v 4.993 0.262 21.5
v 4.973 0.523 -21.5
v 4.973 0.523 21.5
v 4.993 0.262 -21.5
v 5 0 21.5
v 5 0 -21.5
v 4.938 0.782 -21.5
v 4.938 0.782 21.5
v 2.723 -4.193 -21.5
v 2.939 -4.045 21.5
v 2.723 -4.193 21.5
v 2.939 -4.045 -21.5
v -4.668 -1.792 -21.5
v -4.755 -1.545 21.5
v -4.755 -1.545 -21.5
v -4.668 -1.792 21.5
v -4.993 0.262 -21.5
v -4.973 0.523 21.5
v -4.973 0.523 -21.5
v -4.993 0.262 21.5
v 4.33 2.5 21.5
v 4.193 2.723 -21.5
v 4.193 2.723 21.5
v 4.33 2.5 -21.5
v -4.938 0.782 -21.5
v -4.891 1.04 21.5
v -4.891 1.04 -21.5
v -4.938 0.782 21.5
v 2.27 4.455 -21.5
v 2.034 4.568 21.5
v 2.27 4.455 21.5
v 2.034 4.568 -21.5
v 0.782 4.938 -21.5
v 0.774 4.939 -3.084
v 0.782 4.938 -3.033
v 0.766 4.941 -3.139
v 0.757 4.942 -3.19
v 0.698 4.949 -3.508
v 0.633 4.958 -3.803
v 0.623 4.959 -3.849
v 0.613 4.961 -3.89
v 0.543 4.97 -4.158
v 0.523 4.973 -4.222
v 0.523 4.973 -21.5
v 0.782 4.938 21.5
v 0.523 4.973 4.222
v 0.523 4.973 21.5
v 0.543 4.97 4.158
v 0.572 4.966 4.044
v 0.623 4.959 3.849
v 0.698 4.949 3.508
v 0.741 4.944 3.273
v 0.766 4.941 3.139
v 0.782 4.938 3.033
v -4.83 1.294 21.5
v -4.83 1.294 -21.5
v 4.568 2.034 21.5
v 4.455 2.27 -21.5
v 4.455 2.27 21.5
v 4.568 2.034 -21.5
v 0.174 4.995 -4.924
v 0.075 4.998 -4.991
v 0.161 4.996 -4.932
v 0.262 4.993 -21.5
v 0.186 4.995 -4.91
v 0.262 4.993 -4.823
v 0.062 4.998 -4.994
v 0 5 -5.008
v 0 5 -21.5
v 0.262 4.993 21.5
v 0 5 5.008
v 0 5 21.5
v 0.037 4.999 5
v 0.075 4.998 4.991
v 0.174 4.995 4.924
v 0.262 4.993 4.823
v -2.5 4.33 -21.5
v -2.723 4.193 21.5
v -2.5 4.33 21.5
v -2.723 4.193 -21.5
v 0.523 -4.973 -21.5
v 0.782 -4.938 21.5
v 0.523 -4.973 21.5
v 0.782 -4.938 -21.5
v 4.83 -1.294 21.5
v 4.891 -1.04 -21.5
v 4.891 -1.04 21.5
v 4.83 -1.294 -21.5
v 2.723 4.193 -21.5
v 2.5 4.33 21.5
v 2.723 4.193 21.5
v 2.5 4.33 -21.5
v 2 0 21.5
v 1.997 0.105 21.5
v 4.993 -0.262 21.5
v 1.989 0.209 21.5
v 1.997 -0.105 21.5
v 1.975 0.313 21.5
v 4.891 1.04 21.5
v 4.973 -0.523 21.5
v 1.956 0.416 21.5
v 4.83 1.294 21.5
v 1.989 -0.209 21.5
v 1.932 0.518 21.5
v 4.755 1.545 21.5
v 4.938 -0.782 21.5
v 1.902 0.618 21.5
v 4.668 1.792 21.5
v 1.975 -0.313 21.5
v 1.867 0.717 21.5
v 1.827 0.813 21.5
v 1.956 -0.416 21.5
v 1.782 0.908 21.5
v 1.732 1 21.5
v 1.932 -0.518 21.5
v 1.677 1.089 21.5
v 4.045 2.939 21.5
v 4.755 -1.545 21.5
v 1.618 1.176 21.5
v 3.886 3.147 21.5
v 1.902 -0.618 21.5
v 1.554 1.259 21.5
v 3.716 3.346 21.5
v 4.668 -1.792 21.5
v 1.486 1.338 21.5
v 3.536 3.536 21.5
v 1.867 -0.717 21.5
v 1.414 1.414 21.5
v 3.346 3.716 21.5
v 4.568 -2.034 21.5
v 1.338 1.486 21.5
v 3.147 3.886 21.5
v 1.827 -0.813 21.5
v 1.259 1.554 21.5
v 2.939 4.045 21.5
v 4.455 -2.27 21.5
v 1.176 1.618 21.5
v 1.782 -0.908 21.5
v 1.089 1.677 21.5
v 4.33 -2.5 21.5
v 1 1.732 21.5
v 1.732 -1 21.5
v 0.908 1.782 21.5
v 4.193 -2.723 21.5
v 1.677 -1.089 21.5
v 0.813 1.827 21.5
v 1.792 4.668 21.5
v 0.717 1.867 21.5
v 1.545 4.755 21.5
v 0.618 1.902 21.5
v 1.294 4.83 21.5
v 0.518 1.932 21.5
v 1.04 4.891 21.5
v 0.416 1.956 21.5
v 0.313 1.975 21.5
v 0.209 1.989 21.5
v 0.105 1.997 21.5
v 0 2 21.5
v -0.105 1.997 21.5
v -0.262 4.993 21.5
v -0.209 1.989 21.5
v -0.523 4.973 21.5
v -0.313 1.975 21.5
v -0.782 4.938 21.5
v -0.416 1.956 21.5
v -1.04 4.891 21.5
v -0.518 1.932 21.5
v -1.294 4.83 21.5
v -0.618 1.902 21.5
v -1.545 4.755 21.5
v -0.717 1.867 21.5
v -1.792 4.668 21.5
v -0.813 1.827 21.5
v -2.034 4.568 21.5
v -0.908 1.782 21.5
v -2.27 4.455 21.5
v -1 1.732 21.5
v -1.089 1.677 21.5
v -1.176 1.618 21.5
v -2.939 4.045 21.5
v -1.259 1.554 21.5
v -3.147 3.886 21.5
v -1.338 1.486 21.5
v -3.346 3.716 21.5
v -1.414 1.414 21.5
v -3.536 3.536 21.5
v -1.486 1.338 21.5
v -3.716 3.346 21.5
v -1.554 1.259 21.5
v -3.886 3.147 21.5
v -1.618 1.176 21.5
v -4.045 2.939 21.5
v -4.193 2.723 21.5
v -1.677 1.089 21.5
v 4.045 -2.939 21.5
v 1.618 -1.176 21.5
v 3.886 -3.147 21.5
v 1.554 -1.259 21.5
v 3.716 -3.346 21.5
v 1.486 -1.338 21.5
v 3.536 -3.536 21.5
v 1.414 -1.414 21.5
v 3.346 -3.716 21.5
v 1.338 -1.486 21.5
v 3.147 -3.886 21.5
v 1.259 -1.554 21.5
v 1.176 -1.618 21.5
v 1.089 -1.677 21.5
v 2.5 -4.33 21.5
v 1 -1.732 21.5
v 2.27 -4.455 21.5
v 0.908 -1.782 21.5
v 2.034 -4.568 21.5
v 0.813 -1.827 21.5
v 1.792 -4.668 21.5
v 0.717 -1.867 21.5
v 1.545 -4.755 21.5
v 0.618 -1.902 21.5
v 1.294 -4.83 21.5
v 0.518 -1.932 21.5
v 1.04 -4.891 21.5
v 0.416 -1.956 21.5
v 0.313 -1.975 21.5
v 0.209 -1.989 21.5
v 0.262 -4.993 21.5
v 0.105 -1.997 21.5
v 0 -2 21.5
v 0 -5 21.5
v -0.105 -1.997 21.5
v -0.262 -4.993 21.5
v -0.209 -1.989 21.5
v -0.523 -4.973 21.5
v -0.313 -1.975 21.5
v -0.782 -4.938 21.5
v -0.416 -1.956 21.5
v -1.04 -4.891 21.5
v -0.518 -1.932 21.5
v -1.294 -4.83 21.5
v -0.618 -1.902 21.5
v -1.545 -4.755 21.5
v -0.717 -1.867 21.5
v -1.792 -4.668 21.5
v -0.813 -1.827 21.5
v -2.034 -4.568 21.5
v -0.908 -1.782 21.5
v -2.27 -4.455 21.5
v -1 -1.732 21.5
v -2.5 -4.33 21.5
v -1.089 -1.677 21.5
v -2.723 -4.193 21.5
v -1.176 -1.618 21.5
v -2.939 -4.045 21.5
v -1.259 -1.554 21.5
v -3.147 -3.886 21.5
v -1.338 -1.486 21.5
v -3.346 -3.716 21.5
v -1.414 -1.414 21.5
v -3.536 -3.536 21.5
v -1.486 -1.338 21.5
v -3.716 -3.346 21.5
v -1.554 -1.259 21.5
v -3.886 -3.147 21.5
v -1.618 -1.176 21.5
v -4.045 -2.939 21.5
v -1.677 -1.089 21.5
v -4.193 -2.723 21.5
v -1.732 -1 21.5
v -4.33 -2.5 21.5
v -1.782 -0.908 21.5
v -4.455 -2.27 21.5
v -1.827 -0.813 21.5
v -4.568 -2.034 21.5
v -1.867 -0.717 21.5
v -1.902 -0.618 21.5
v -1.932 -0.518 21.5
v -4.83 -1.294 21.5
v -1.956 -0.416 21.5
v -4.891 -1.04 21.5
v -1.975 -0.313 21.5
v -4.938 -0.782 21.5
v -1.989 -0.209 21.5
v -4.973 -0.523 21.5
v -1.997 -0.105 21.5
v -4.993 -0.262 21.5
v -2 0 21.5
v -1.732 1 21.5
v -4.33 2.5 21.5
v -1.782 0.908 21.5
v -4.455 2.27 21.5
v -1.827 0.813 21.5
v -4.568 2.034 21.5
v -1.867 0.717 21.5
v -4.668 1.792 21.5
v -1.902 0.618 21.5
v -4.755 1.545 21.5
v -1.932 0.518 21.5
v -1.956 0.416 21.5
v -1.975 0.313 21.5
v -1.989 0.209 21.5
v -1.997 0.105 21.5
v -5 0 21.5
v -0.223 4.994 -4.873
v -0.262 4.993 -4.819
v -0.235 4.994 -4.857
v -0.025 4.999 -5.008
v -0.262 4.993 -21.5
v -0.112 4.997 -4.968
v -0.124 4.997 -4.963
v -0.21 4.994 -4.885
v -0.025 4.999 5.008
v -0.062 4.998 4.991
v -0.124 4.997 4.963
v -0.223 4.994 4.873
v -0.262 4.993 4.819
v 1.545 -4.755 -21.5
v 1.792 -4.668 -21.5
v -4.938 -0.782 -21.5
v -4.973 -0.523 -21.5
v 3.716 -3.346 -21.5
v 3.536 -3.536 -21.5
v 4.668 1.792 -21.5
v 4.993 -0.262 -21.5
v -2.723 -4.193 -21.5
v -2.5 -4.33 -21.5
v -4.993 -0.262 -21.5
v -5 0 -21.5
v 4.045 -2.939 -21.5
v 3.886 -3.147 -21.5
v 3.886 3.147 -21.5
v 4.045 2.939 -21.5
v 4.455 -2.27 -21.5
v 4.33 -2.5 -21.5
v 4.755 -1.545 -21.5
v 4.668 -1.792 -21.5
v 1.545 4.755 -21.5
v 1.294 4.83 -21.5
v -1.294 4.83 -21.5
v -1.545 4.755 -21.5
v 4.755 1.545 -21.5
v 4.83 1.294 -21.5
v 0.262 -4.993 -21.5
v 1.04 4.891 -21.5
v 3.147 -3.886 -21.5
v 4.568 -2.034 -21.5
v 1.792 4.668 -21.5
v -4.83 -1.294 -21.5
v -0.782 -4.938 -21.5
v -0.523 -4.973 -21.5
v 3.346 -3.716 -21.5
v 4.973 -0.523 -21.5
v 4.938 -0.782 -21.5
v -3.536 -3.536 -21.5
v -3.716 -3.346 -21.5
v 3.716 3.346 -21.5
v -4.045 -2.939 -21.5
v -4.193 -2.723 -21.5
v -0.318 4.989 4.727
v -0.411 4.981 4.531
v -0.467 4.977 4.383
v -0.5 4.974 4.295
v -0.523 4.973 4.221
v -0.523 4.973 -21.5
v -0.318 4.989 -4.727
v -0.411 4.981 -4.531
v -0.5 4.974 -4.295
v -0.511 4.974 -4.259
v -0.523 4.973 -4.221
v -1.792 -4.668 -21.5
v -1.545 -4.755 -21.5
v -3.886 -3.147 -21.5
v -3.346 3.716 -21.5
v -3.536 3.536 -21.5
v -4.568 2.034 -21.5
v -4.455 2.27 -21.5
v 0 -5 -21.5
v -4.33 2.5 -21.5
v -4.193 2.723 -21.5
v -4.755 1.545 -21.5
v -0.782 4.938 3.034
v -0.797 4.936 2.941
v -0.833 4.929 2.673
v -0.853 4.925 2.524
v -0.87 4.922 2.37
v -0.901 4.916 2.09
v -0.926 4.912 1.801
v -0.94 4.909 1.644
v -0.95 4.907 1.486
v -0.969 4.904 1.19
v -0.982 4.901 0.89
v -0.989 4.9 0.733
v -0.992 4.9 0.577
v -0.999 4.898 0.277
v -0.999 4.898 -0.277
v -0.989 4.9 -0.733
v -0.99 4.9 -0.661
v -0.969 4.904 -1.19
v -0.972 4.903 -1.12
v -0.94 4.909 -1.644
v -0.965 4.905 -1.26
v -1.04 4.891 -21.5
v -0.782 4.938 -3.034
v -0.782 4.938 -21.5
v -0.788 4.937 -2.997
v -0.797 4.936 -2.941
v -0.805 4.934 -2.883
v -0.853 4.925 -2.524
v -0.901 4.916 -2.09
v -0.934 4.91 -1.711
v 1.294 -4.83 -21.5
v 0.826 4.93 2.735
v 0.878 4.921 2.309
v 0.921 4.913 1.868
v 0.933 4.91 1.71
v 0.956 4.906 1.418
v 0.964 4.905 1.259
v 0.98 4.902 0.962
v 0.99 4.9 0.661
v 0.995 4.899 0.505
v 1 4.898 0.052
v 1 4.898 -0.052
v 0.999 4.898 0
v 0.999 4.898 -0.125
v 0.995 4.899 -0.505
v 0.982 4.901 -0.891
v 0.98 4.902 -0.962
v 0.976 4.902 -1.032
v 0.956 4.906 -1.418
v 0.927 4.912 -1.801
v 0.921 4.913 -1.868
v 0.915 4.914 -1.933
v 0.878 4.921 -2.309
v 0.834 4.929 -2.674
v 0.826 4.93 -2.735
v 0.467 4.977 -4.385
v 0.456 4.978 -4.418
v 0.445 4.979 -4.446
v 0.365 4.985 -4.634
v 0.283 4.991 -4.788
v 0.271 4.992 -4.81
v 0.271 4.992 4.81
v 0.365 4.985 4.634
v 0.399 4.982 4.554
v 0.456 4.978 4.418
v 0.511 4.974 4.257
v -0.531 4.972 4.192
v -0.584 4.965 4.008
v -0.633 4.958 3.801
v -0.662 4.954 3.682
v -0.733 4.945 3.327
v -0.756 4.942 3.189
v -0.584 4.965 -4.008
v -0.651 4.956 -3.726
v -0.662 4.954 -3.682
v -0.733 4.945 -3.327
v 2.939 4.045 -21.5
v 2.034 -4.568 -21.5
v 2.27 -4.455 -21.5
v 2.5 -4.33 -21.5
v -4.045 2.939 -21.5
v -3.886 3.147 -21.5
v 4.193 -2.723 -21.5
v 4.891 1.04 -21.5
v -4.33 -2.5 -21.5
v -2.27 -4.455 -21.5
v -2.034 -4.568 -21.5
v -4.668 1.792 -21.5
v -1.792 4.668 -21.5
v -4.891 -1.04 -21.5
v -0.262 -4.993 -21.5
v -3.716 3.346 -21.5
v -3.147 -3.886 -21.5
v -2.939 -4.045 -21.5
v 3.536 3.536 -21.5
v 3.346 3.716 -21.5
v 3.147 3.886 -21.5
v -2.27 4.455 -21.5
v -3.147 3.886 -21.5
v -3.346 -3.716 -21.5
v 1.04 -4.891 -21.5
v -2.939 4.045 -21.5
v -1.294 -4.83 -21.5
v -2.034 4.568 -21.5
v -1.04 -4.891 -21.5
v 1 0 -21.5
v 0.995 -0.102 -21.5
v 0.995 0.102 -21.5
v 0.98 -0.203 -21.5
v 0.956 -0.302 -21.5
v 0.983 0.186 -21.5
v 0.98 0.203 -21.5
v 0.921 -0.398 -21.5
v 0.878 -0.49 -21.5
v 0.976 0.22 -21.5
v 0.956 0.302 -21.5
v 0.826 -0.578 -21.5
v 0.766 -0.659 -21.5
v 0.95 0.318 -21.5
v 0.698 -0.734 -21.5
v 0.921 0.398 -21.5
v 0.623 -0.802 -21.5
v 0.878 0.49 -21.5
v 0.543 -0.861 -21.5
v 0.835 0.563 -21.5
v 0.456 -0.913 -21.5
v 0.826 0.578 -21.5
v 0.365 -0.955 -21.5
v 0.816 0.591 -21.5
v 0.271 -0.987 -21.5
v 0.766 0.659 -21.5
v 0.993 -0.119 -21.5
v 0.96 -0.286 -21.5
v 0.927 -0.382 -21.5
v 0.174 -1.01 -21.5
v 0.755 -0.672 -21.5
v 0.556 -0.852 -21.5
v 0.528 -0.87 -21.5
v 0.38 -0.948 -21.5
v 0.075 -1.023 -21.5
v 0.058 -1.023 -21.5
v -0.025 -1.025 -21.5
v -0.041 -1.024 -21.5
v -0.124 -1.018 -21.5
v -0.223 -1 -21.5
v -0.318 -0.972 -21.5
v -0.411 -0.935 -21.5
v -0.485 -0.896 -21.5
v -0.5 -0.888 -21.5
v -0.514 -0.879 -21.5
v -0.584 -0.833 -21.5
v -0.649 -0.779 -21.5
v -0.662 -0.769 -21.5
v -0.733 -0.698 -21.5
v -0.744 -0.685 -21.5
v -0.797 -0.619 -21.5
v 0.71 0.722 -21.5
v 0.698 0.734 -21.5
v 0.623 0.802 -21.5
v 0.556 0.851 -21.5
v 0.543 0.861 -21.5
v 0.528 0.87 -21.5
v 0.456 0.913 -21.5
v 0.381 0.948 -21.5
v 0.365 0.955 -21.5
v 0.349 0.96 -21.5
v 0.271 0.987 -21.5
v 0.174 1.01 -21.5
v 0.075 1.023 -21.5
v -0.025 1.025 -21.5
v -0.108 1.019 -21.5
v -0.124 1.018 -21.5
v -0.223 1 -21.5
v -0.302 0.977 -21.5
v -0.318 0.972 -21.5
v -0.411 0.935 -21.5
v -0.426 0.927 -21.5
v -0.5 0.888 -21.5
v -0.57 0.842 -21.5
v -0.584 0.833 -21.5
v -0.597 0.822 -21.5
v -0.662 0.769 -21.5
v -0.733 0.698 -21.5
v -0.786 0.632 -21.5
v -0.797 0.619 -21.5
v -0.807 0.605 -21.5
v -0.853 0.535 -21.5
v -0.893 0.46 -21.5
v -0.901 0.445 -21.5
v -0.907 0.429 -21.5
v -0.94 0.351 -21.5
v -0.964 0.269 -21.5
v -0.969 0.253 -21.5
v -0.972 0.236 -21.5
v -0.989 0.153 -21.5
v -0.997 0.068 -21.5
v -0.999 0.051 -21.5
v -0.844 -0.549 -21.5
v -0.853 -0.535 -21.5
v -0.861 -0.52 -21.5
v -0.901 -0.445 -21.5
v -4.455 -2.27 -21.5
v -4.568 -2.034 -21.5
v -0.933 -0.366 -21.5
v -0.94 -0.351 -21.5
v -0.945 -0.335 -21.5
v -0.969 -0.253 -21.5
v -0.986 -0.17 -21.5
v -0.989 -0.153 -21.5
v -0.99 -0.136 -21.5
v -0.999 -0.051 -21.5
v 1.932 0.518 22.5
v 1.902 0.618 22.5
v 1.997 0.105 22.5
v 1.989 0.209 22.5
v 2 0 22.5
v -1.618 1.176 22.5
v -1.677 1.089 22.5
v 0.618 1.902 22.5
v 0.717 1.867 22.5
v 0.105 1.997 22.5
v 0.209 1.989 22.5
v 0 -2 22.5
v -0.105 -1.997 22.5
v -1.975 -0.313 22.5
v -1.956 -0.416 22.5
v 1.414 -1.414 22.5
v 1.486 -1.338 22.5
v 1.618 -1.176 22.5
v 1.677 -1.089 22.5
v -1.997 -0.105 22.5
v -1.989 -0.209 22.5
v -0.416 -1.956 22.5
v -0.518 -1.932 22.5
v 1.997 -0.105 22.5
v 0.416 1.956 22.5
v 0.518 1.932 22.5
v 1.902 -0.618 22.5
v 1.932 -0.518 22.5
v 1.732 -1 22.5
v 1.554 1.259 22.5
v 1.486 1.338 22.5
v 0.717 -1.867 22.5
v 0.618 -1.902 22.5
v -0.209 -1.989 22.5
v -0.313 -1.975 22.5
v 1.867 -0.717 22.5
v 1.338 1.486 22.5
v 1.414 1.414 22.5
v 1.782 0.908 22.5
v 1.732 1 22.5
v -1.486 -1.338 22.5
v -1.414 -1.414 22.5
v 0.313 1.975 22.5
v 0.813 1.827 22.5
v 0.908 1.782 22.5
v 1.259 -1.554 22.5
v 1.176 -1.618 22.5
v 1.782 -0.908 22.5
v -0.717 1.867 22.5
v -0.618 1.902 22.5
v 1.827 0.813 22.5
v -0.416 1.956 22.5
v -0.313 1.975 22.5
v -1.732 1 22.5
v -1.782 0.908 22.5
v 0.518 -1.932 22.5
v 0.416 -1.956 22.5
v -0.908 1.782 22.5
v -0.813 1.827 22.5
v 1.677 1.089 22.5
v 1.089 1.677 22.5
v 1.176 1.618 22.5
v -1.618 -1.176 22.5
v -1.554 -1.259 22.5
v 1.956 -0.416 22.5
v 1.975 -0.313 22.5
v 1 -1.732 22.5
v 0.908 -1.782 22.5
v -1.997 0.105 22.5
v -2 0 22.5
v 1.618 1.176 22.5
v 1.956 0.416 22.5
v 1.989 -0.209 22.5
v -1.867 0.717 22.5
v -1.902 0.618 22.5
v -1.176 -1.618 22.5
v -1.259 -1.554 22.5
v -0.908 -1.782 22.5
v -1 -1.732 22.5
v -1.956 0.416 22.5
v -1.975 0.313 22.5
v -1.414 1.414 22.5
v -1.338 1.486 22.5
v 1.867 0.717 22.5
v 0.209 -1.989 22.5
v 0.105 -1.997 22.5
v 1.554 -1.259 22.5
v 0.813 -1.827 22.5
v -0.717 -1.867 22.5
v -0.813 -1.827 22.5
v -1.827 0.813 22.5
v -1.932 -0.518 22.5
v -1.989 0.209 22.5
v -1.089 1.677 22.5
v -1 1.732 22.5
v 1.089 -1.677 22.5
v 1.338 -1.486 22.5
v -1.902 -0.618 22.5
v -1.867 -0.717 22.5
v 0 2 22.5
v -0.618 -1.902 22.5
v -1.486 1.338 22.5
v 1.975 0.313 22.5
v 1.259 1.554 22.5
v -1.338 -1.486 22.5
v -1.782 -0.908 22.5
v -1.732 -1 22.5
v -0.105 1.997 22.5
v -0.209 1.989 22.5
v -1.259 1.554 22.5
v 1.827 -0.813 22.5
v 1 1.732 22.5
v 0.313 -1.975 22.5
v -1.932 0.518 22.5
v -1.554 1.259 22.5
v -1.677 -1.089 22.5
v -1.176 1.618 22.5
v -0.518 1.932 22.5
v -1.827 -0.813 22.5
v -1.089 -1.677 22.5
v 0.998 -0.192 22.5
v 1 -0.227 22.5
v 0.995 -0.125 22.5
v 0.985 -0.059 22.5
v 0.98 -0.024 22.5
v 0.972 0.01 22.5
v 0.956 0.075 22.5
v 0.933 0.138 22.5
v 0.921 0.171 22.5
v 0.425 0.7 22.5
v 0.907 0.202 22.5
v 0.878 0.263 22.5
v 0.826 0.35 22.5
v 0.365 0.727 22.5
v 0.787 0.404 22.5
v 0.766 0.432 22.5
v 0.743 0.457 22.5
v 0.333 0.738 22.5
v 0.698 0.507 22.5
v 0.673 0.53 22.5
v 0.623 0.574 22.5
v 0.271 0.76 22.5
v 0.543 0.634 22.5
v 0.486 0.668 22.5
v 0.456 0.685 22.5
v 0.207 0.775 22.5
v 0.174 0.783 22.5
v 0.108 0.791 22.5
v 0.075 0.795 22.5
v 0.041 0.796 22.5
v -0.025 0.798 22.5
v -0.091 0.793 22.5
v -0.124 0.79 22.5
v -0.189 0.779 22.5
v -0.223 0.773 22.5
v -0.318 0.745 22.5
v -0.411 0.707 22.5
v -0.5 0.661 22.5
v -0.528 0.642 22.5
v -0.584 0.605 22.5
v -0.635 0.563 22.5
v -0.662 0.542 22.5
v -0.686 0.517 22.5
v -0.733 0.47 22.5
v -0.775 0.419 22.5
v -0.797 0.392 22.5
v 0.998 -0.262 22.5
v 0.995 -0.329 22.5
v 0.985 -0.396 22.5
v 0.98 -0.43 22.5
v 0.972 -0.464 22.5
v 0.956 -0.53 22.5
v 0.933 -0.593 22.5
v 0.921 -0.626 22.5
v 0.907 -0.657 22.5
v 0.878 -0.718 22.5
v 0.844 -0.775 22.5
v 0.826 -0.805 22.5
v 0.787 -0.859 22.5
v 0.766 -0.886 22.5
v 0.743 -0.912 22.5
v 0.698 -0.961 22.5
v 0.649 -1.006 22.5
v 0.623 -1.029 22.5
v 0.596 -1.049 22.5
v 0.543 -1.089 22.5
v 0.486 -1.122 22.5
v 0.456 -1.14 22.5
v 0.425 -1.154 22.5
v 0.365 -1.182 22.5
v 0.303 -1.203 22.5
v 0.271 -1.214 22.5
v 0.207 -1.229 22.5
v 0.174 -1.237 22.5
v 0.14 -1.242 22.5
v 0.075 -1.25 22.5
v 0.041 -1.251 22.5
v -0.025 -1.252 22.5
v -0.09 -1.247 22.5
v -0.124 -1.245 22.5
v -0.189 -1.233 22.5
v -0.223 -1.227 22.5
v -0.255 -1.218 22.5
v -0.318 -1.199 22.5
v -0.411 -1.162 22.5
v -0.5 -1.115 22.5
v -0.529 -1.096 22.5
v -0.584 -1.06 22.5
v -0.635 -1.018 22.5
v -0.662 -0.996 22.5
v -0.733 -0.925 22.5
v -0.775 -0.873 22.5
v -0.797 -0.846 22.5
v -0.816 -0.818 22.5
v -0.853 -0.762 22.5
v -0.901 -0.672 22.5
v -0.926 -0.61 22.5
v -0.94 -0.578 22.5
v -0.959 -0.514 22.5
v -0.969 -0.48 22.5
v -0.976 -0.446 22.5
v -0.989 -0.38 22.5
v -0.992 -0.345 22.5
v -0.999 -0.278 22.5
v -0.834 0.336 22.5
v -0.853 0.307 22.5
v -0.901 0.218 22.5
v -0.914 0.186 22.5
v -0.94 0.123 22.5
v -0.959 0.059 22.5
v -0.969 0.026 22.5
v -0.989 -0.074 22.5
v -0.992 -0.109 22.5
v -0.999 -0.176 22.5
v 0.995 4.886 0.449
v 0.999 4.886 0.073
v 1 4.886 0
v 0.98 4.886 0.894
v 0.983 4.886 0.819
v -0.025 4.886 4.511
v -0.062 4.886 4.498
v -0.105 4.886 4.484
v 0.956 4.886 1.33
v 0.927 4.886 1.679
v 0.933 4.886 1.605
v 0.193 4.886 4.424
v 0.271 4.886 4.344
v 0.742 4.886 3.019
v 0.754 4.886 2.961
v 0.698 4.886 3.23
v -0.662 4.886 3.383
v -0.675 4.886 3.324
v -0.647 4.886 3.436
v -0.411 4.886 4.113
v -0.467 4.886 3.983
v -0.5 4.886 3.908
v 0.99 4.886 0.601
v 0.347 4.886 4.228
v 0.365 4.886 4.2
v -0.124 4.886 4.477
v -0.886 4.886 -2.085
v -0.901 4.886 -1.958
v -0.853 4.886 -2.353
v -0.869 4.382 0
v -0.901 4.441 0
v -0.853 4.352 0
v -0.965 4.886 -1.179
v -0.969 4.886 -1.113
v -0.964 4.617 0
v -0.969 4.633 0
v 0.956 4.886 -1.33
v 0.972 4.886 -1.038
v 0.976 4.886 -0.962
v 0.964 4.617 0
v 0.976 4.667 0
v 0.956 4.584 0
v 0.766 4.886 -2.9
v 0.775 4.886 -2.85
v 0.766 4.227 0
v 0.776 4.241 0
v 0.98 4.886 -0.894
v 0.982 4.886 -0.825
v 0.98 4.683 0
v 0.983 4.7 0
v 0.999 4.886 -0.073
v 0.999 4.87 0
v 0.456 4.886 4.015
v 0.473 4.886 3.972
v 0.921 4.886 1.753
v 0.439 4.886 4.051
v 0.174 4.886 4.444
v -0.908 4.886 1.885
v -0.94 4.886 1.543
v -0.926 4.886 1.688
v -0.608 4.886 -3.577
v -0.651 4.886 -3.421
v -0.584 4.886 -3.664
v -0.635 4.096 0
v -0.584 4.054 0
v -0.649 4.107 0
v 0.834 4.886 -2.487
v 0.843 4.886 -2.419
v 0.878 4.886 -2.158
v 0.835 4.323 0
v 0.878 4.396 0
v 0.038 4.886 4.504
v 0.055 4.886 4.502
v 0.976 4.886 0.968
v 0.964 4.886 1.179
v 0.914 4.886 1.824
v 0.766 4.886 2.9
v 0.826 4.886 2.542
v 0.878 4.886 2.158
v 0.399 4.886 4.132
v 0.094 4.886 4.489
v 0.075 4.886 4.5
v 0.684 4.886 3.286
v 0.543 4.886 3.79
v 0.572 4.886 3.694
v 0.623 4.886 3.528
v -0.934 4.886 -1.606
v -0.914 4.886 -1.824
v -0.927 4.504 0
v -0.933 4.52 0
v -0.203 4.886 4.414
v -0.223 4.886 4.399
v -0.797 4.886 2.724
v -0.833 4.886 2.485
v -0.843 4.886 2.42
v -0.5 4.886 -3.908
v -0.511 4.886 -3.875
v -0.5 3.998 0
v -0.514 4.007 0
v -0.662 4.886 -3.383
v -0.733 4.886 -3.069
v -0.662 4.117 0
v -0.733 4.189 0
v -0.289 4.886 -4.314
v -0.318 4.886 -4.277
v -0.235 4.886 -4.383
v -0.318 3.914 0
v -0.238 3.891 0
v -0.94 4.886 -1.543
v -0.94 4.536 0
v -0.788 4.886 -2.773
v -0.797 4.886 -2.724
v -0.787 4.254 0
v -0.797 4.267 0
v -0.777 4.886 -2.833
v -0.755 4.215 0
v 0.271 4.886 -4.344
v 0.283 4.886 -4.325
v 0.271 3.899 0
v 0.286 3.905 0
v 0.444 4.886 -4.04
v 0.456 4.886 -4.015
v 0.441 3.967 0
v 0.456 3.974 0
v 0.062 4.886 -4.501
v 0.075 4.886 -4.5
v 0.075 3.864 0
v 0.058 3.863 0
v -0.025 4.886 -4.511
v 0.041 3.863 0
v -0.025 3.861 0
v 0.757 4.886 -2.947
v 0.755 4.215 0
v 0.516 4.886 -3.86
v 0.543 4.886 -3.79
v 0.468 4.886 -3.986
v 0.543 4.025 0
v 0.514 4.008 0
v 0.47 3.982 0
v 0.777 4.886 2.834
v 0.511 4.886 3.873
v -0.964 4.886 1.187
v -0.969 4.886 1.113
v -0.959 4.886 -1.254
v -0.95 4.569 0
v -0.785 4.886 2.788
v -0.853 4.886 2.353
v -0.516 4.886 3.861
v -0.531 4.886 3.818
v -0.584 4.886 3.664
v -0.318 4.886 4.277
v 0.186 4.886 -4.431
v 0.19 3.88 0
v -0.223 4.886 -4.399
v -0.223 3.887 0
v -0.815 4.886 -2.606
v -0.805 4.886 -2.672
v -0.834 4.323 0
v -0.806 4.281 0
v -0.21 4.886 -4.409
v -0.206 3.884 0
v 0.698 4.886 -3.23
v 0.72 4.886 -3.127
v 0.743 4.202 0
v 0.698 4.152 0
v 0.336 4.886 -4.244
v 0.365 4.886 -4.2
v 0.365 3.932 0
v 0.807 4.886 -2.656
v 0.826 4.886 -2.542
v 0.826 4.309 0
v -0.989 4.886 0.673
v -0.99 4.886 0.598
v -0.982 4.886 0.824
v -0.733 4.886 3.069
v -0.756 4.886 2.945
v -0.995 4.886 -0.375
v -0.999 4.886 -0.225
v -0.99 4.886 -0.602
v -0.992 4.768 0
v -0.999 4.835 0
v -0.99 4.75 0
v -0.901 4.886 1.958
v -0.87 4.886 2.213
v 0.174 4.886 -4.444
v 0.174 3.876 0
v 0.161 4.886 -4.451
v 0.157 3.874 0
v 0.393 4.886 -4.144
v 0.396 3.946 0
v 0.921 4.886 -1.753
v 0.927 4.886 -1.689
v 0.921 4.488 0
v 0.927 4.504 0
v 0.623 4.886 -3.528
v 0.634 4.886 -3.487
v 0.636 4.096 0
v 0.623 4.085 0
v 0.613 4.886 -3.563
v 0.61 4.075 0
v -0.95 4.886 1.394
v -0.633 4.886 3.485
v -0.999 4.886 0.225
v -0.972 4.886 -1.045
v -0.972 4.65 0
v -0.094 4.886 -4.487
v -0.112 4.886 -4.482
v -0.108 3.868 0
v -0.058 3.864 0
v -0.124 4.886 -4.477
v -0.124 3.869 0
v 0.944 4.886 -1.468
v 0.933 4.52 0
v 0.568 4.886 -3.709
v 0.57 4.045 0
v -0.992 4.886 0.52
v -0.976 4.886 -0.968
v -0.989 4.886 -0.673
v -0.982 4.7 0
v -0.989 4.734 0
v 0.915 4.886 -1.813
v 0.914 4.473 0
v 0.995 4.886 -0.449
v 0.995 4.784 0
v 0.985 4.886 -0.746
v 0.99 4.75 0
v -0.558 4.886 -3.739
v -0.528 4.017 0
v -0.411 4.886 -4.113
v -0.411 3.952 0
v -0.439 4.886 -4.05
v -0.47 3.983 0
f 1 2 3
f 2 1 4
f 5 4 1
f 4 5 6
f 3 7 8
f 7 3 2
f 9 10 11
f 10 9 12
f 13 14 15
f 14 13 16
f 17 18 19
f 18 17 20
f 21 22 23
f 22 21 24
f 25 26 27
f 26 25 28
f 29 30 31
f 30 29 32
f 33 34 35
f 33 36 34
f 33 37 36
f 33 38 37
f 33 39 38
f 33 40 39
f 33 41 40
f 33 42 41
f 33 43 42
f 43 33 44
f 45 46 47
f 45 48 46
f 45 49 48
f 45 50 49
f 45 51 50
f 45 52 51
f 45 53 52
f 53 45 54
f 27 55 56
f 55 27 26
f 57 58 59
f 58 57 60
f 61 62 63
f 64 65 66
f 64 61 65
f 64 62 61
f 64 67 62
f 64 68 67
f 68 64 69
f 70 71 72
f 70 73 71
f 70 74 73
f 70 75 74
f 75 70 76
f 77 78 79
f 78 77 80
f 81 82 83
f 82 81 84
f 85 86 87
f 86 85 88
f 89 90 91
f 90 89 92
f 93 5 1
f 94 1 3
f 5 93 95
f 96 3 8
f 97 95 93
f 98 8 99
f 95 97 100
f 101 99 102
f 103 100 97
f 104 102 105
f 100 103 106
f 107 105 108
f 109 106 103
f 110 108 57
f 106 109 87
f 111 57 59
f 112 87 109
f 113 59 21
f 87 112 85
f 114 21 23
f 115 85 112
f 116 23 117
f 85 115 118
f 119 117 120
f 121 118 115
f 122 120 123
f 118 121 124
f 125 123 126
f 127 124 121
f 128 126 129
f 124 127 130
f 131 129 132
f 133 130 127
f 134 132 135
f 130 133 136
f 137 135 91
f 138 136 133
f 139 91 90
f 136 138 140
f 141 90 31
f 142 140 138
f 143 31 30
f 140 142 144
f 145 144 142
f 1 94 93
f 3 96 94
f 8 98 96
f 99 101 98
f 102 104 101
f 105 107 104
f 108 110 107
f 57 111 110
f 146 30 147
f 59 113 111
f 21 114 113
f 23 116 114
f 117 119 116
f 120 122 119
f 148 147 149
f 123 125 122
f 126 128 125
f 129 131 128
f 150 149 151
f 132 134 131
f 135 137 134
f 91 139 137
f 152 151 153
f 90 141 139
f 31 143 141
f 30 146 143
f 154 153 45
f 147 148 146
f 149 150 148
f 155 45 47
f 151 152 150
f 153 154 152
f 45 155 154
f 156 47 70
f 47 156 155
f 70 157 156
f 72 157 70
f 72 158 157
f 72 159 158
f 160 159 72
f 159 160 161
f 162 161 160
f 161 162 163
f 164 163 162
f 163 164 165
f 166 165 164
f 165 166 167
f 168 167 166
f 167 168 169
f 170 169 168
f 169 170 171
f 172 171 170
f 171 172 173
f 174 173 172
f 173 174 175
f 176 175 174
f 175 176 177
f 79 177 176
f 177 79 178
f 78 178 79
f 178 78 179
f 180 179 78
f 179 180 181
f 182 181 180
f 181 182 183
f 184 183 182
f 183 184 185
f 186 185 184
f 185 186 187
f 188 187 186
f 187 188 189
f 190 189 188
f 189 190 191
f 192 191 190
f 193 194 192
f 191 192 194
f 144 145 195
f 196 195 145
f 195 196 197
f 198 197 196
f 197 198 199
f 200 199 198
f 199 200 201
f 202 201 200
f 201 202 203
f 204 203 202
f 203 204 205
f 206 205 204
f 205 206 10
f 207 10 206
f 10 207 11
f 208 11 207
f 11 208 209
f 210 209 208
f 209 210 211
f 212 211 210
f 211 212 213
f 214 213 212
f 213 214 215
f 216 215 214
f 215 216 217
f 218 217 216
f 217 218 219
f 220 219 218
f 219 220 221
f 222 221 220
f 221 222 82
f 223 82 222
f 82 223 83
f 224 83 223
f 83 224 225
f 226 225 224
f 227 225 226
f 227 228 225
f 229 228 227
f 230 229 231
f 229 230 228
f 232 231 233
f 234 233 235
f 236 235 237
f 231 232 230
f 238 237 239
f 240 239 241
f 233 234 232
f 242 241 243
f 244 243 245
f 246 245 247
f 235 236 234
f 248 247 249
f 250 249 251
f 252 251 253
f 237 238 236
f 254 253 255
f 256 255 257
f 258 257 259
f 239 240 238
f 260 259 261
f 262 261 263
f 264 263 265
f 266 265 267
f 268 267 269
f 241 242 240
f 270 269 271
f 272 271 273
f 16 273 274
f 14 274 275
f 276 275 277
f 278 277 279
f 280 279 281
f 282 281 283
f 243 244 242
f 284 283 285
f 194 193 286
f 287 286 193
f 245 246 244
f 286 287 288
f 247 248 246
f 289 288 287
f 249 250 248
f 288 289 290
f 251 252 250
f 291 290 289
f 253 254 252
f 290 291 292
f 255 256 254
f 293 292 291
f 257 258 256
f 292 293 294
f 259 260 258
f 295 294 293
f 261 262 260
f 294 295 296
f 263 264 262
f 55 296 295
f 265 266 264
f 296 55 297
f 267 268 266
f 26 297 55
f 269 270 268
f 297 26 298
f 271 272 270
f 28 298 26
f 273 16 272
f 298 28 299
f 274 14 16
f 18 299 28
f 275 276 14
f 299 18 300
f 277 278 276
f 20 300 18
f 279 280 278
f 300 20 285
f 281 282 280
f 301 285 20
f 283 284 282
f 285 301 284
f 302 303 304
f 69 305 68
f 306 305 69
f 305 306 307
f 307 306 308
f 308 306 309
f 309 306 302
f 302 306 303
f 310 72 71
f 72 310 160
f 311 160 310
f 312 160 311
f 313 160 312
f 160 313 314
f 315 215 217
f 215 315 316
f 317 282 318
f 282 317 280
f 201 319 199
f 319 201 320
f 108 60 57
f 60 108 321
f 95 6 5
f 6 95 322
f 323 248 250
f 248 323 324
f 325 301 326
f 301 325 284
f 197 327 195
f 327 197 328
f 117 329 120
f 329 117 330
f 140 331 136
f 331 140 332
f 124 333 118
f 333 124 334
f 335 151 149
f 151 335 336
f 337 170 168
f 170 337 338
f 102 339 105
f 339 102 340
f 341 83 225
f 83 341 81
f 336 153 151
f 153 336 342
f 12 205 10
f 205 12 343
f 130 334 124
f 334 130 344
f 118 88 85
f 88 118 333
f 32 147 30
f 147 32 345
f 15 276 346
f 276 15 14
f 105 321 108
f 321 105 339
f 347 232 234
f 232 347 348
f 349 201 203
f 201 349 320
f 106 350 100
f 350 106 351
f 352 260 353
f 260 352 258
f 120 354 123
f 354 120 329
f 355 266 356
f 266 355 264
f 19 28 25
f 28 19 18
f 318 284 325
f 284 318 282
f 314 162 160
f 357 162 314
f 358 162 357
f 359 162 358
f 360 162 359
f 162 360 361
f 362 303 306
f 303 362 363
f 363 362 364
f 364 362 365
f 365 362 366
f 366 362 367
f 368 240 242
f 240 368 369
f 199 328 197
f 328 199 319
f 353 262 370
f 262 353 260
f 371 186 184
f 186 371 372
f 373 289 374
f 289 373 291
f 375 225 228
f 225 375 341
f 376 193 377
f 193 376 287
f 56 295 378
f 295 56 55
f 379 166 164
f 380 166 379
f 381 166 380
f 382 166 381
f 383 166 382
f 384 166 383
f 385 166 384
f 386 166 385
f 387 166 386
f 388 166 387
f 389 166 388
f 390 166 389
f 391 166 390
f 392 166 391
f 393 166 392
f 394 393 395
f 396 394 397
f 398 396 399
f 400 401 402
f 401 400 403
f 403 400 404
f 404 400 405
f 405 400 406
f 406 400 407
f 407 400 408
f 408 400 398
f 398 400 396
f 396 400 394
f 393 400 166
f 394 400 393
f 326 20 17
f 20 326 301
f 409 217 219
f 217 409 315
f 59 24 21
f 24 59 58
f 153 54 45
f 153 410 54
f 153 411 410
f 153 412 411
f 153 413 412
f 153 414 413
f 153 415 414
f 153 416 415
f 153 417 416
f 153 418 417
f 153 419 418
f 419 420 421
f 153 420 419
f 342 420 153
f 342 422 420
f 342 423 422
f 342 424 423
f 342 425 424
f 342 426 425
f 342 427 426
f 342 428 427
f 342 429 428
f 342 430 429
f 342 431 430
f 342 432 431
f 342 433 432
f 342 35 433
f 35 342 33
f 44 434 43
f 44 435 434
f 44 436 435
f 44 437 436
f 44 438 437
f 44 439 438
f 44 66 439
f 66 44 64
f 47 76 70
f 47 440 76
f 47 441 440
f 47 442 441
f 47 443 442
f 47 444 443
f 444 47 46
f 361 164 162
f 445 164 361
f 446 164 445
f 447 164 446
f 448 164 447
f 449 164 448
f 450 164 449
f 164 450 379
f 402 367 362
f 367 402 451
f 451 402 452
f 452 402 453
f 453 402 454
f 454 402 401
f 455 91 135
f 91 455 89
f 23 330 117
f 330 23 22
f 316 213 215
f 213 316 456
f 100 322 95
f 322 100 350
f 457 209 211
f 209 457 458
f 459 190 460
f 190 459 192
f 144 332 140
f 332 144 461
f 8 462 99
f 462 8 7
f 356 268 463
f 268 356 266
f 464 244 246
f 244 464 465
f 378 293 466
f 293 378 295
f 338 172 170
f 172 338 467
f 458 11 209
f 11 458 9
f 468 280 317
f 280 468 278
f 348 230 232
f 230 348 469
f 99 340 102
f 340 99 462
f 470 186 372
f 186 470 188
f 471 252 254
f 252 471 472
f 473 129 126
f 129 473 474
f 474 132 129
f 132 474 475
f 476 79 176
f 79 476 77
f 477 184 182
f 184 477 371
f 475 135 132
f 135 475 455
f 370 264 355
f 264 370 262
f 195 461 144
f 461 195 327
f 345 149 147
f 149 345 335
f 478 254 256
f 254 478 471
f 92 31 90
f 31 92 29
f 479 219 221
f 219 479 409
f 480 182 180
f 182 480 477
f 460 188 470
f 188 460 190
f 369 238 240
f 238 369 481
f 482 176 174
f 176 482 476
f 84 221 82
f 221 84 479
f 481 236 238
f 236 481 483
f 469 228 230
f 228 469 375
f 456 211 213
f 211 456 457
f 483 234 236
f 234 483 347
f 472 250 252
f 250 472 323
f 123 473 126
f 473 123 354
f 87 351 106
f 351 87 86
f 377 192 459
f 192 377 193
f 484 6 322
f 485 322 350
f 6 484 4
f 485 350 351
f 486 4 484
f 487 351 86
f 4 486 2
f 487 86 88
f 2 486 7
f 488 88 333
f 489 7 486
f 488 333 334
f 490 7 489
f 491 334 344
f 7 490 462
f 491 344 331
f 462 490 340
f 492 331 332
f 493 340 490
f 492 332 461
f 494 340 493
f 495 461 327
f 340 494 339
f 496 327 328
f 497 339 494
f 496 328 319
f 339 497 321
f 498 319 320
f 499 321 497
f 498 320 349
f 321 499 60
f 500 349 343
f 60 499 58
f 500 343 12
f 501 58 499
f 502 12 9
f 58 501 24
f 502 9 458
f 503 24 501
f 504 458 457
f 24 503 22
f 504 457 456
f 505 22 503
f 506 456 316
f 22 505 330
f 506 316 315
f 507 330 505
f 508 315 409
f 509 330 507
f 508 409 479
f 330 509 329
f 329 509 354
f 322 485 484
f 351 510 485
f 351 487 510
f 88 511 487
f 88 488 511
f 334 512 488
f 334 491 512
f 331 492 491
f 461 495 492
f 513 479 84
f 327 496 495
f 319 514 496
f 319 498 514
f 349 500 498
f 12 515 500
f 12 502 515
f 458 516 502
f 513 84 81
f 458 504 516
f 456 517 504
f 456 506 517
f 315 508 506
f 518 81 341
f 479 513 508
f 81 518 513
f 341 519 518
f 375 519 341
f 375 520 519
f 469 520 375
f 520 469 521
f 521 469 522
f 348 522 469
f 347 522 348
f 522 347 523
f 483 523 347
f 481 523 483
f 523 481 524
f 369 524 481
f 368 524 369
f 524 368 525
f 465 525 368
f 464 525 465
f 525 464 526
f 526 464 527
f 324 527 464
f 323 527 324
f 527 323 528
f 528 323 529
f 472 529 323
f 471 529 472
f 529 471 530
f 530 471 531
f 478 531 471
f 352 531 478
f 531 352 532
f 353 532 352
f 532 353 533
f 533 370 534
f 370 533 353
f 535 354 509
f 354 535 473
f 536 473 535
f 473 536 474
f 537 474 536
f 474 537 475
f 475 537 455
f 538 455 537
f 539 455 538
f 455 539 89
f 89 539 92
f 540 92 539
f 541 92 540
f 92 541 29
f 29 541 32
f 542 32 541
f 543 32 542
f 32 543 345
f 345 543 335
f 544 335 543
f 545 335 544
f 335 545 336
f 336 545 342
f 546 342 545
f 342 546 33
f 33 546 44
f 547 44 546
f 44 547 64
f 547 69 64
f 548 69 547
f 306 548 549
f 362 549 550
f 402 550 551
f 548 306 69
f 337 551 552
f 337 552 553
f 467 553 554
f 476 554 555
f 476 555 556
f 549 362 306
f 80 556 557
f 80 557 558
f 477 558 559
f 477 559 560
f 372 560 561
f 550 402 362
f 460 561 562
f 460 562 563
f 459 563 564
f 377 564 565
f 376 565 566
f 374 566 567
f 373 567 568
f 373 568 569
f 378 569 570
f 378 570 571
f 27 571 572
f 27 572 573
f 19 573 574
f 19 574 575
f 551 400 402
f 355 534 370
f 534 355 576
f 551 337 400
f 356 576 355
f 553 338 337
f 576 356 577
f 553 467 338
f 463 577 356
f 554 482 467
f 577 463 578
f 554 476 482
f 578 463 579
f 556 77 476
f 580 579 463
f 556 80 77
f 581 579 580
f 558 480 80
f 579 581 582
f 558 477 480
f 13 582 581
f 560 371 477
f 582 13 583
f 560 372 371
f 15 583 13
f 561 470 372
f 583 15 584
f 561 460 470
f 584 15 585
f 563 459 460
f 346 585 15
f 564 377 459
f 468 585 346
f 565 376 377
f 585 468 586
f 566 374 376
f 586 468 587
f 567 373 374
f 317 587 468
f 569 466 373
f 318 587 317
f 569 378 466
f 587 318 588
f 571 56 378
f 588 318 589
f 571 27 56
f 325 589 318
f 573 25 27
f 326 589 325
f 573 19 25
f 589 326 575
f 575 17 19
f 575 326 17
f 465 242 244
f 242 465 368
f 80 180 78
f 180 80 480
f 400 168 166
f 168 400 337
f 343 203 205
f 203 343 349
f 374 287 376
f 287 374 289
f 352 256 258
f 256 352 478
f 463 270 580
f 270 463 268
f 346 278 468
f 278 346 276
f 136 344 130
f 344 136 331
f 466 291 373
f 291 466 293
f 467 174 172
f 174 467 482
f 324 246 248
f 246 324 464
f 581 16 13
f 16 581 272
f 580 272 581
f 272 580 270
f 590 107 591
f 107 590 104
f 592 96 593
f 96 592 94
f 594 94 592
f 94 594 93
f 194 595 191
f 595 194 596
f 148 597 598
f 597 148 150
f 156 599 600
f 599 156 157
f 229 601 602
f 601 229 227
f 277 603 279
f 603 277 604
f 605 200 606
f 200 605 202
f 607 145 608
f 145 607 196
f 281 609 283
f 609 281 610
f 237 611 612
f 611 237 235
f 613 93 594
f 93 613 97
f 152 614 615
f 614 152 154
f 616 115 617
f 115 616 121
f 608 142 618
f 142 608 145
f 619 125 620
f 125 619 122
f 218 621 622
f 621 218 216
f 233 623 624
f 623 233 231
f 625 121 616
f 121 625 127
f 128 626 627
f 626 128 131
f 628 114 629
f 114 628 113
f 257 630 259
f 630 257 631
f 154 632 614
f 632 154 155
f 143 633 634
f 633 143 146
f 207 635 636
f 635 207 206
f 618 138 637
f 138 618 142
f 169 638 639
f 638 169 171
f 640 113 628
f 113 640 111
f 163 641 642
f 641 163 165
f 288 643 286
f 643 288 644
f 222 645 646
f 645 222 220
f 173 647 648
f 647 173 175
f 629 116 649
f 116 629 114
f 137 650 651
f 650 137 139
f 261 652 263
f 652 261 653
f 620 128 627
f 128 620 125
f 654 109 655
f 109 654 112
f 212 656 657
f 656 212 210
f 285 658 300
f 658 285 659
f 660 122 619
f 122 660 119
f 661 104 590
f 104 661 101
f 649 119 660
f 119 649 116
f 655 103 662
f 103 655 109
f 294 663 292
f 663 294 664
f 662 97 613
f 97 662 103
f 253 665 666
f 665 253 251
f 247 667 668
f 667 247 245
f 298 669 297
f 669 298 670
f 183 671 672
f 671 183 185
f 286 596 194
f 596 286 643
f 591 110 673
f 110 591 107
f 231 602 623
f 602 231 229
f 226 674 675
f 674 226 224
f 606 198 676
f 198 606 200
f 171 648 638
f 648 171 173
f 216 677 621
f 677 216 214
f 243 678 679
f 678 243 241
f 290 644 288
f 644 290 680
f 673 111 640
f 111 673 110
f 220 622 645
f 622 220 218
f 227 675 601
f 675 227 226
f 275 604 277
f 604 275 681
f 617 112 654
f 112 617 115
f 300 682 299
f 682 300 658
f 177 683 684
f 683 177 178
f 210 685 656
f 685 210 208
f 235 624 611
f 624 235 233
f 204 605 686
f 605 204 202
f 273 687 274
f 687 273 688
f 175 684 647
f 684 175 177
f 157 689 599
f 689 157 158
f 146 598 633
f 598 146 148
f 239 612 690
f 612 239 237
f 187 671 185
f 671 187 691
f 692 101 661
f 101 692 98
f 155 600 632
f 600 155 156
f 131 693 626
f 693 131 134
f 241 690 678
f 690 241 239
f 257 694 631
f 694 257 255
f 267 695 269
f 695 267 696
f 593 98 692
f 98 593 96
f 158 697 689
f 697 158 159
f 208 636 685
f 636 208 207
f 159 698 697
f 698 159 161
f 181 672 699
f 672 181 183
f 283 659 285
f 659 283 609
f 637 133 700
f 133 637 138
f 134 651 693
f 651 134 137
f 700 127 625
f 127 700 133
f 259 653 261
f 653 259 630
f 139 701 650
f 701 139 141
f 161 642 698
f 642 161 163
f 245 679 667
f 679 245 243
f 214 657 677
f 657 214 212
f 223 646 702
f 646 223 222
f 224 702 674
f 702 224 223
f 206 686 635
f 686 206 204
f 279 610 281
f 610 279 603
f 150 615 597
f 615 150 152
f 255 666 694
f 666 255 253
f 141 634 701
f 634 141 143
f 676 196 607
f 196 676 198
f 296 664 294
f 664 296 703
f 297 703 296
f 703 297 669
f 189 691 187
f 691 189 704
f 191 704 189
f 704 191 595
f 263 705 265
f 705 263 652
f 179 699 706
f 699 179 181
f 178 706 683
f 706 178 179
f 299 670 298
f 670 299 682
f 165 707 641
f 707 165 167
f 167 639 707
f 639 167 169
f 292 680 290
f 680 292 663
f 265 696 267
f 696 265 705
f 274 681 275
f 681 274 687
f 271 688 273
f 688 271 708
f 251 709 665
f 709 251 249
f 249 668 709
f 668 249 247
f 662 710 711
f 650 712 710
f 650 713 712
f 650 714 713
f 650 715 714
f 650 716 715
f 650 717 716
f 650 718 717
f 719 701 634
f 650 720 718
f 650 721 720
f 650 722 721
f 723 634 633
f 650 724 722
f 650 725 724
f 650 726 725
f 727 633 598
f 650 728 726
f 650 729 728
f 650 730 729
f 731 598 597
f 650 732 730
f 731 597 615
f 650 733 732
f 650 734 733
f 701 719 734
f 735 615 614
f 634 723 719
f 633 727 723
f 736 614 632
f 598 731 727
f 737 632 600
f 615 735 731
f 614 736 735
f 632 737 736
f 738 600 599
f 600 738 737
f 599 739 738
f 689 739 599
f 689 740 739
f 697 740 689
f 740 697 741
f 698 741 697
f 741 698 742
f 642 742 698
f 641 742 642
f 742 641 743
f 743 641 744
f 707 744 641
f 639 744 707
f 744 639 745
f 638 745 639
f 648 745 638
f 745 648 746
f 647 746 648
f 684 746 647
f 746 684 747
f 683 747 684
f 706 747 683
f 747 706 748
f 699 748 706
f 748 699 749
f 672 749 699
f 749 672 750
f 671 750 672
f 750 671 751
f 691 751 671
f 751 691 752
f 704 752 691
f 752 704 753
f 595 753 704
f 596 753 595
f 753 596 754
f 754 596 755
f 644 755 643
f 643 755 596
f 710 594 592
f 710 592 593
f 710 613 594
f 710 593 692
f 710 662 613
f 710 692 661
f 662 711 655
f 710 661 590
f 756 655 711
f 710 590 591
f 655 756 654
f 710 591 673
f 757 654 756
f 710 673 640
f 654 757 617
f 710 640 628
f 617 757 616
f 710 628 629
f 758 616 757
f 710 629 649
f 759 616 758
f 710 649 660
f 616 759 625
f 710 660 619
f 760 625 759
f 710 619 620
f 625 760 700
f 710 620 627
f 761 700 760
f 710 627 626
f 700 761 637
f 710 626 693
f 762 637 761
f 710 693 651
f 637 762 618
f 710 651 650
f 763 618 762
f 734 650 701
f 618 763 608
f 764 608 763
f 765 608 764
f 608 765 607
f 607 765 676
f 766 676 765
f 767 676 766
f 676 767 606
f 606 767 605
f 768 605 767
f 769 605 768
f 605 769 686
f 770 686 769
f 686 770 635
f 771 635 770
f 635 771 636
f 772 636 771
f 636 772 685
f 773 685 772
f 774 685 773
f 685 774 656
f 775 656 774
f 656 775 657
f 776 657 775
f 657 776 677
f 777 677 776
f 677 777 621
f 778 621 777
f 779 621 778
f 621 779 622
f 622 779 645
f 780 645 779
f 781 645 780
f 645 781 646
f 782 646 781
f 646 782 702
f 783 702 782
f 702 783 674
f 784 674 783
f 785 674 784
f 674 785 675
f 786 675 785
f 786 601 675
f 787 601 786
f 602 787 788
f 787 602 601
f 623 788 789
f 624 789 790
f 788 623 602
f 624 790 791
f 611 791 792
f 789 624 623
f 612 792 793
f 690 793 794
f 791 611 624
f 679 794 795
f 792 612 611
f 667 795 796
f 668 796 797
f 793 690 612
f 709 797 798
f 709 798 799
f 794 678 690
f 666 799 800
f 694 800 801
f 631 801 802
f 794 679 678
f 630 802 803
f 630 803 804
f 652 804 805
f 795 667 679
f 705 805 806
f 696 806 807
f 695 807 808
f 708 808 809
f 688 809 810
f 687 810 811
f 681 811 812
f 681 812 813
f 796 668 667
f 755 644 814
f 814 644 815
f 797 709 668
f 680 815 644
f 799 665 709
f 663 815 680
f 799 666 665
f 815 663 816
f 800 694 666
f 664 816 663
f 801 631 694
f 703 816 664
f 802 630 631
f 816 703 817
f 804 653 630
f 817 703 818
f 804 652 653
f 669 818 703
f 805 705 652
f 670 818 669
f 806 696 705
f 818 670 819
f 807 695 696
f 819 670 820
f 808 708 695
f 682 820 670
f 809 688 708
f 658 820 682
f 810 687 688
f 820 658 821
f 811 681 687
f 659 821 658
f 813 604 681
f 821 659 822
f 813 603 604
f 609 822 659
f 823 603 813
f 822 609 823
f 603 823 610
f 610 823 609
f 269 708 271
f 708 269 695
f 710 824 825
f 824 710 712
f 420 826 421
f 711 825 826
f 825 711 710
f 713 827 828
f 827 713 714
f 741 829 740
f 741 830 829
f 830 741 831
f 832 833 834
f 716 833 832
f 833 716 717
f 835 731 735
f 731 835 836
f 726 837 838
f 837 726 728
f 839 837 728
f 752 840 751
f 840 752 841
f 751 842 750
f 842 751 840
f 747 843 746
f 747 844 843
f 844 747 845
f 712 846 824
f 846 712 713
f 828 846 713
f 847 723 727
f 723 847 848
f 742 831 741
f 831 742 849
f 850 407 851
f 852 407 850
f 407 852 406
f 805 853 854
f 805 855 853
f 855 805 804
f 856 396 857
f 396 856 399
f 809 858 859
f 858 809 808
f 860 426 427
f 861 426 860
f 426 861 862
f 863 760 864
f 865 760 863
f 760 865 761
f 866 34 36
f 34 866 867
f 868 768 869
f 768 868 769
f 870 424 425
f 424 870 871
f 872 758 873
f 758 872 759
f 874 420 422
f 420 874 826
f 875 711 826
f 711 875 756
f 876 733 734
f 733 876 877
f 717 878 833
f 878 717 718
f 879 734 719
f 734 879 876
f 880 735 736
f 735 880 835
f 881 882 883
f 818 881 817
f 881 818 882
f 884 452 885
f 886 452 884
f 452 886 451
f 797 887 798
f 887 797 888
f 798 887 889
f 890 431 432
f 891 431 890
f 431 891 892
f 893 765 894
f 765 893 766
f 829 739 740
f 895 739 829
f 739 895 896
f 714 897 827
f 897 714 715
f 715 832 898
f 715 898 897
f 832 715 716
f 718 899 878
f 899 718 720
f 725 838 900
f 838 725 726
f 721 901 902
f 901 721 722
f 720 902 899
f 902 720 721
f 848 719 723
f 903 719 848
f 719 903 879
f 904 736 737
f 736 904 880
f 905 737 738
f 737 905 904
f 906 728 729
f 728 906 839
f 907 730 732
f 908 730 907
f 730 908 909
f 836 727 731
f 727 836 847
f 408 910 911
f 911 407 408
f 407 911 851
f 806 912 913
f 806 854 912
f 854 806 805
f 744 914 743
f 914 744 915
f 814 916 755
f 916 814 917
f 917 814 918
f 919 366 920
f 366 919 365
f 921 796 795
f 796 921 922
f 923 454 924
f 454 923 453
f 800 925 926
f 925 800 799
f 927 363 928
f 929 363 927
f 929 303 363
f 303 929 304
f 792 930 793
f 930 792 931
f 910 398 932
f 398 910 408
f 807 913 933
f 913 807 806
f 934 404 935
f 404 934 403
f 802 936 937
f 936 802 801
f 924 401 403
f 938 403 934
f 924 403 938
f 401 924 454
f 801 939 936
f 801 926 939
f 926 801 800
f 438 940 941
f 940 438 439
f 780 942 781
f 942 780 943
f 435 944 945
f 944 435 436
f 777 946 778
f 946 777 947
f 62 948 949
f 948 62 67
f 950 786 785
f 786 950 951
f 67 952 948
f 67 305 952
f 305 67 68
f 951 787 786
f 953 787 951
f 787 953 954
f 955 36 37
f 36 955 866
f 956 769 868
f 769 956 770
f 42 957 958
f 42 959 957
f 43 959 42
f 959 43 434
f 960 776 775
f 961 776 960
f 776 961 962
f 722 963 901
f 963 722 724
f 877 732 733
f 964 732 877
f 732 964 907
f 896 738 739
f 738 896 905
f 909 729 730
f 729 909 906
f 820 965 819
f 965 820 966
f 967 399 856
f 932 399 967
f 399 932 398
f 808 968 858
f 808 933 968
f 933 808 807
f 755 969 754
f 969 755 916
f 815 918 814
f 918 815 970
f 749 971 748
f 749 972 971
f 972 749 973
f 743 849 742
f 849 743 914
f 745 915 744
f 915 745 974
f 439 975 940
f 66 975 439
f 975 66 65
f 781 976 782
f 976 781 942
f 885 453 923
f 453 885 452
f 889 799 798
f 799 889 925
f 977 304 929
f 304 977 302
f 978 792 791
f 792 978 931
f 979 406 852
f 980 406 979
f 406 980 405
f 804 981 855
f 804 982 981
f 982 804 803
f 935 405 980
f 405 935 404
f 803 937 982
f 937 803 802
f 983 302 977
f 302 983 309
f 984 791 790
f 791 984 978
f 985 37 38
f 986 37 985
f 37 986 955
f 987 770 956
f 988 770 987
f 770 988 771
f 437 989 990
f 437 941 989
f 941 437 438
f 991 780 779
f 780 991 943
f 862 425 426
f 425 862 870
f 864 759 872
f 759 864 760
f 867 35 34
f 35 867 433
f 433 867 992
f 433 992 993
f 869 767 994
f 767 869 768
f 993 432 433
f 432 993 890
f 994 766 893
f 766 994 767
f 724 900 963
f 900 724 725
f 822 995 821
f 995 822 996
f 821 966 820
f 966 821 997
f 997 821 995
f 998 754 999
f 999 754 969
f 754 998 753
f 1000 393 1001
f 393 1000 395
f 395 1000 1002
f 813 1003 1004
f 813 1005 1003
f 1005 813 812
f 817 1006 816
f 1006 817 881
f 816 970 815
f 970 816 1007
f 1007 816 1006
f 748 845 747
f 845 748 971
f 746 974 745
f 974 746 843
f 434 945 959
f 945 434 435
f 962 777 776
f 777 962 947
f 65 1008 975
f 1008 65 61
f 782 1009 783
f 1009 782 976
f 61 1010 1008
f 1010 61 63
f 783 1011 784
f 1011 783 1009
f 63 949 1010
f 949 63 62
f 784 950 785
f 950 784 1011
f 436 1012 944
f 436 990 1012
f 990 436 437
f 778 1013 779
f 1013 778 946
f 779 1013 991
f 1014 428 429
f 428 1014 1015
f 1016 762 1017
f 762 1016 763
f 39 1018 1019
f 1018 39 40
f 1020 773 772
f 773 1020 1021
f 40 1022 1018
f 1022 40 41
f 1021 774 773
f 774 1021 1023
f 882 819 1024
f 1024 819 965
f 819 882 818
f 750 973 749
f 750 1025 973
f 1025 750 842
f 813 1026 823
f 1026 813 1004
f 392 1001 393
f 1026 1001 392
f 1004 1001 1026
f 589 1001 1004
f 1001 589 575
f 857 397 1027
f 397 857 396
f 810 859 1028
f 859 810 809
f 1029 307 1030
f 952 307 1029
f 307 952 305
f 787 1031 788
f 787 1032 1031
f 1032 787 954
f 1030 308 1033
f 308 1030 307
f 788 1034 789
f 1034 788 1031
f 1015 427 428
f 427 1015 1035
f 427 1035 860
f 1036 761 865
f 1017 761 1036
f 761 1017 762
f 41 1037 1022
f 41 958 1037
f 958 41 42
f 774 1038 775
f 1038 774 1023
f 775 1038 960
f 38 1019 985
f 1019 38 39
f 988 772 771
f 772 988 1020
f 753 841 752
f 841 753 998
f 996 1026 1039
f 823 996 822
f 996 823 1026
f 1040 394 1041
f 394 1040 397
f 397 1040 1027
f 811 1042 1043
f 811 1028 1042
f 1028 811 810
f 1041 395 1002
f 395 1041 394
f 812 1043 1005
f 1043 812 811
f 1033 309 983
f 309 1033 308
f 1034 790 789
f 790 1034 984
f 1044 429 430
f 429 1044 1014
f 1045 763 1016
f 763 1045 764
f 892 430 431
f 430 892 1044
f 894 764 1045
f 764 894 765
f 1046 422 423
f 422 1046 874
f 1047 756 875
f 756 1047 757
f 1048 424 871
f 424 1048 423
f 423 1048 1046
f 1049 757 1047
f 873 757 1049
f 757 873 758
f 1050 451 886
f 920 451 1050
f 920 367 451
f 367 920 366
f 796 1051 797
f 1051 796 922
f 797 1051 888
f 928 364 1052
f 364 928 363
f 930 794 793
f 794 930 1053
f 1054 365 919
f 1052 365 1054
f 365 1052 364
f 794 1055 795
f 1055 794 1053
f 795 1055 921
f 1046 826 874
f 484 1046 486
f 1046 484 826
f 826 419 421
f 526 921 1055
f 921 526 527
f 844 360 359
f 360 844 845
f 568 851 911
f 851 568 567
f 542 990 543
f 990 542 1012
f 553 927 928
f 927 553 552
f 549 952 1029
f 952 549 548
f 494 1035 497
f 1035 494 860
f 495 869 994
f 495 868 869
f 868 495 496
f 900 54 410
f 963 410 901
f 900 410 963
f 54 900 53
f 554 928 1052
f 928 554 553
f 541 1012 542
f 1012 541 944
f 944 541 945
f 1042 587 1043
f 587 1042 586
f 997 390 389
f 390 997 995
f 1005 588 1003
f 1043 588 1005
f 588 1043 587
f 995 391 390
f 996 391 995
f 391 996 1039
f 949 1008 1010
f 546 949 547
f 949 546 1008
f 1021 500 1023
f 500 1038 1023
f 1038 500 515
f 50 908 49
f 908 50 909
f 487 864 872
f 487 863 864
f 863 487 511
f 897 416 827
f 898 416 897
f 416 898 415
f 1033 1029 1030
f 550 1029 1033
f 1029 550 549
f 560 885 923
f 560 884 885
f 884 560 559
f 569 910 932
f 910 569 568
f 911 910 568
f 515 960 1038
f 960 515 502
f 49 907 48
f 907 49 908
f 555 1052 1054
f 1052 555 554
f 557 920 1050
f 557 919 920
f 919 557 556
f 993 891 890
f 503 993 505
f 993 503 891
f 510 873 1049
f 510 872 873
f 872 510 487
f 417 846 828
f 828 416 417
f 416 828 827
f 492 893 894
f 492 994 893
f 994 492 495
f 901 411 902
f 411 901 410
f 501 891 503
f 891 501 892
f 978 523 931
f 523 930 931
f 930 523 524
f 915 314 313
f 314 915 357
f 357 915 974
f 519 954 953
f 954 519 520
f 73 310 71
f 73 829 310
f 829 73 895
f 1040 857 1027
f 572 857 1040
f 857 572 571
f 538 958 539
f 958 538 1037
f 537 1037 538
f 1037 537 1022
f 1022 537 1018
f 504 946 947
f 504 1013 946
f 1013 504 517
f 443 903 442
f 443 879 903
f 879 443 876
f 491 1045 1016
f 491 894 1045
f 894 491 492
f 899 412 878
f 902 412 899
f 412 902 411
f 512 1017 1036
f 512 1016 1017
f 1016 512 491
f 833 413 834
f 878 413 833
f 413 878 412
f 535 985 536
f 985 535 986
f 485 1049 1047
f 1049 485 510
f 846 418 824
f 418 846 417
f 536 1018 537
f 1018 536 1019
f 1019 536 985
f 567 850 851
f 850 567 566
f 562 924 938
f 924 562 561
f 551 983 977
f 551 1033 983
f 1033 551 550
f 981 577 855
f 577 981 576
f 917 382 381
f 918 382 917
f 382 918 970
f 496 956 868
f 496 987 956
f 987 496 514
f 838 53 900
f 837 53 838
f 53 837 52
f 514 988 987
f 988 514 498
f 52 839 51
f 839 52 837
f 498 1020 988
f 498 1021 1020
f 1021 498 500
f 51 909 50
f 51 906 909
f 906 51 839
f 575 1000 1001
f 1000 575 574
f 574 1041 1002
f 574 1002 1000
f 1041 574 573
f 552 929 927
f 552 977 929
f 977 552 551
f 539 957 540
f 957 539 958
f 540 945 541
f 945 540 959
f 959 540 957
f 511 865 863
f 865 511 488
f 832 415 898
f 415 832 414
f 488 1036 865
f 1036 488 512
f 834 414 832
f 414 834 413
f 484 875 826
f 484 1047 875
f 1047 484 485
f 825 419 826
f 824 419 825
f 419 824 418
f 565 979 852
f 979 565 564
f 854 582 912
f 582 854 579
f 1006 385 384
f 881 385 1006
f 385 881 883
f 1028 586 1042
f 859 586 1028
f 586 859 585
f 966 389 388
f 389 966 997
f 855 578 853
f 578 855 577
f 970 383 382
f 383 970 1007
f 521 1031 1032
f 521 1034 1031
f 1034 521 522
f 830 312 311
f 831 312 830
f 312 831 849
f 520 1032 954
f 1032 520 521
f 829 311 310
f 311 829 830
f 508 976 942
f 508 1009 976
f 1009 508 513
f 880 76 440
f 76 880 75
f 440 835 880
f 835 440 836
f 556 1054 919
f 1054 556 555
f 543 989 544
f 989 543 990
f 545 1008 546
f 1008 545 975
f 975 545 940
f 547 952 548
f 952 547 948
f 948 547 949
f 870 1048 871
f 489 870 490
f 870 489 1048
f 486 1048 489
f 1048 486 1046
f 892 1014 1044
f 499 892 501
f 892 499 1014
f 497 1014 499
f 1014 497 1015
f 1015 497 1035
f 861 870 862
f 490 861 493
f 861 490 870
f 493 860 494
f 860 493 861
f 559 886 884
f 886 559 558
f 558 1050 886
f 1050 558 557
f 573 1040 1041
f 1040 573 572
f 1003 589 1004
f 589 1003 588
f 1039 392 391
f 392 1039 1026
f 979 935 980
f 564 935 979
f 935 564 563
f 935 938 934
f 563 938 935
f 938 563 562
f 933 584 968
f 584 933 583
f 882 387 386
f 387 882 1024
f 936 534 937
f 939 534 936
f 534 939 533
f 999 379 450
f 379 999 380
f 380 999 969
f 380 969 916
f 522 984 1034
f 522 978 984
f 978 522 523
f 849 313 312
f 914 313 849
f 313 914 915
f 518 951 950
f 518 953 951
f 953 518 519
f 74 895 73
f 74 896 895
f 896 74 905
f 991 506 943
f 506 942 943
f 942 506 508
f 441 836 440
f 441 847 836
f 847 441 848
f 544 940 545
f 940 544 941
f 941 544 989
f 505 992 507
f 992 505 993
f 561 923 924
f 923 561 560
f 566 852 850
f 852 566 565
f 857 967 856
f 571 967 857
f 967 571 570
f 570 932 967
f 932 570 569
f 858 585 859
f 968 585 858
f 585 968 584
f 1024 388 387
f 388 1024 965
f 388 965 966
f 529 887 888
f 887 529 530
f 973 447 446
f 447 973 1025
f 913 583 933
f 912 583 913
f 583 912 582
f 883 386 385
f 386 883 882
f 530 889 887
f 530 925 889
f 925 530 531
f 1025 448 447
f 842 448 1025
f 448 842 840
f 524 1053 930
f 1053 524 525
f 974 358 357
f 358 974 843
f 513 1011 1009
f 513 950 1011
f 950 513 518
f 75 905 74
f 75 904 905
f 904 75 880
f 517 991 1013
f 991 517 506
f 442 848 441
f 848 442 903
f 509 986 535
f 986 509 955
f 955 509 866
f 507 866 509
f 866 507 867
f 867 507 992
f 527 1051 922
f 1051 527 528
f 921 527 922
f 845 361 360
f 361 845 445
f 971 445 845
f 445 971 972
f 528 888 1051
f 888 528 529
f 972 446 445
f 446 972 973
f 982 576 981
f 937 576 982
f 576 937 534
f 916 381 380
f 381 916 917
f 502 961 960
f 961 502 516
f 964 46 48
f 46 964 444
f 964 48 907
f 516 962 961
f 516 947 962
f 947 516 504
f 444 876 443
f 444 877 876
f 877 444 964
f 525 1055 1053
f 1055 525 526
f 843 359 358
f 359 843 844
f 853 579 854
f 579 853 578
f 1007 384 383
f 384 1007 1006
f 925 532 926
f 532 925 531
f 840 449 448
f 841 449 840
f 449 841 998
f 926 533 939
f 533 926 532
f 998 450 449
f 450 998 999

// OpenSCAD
// cylindrical battery spacer with holes to route wires

module cell(length, diameter, button_dia, button_height) {
     difference() {
          union() {
               cylinder(length, diameter/2, diameter/2, true);
               translate([0,0,length/2]) cylinder(button_height, button_dia/2, button_dia/2);
          };
          hole_angle = atan(diameter/(length+button_height));
          hole_rad = 1;
          translate([0,0,length/2])
               rotate([hole_angle,0,0])
               translate([0,0,length/2])
               cylinder(length*3, hole_rad, hole_rad, true);
          translate([0,0,-length/2])
               rotate([-hole_angle,0,0])
               translate([0,0,-length/2])
               cylinder(length*3, hole_rad, true);
     };
}

// AAA
$fa = 3;
$fs = .1;
cell(44-1, 10, 4, 1);
